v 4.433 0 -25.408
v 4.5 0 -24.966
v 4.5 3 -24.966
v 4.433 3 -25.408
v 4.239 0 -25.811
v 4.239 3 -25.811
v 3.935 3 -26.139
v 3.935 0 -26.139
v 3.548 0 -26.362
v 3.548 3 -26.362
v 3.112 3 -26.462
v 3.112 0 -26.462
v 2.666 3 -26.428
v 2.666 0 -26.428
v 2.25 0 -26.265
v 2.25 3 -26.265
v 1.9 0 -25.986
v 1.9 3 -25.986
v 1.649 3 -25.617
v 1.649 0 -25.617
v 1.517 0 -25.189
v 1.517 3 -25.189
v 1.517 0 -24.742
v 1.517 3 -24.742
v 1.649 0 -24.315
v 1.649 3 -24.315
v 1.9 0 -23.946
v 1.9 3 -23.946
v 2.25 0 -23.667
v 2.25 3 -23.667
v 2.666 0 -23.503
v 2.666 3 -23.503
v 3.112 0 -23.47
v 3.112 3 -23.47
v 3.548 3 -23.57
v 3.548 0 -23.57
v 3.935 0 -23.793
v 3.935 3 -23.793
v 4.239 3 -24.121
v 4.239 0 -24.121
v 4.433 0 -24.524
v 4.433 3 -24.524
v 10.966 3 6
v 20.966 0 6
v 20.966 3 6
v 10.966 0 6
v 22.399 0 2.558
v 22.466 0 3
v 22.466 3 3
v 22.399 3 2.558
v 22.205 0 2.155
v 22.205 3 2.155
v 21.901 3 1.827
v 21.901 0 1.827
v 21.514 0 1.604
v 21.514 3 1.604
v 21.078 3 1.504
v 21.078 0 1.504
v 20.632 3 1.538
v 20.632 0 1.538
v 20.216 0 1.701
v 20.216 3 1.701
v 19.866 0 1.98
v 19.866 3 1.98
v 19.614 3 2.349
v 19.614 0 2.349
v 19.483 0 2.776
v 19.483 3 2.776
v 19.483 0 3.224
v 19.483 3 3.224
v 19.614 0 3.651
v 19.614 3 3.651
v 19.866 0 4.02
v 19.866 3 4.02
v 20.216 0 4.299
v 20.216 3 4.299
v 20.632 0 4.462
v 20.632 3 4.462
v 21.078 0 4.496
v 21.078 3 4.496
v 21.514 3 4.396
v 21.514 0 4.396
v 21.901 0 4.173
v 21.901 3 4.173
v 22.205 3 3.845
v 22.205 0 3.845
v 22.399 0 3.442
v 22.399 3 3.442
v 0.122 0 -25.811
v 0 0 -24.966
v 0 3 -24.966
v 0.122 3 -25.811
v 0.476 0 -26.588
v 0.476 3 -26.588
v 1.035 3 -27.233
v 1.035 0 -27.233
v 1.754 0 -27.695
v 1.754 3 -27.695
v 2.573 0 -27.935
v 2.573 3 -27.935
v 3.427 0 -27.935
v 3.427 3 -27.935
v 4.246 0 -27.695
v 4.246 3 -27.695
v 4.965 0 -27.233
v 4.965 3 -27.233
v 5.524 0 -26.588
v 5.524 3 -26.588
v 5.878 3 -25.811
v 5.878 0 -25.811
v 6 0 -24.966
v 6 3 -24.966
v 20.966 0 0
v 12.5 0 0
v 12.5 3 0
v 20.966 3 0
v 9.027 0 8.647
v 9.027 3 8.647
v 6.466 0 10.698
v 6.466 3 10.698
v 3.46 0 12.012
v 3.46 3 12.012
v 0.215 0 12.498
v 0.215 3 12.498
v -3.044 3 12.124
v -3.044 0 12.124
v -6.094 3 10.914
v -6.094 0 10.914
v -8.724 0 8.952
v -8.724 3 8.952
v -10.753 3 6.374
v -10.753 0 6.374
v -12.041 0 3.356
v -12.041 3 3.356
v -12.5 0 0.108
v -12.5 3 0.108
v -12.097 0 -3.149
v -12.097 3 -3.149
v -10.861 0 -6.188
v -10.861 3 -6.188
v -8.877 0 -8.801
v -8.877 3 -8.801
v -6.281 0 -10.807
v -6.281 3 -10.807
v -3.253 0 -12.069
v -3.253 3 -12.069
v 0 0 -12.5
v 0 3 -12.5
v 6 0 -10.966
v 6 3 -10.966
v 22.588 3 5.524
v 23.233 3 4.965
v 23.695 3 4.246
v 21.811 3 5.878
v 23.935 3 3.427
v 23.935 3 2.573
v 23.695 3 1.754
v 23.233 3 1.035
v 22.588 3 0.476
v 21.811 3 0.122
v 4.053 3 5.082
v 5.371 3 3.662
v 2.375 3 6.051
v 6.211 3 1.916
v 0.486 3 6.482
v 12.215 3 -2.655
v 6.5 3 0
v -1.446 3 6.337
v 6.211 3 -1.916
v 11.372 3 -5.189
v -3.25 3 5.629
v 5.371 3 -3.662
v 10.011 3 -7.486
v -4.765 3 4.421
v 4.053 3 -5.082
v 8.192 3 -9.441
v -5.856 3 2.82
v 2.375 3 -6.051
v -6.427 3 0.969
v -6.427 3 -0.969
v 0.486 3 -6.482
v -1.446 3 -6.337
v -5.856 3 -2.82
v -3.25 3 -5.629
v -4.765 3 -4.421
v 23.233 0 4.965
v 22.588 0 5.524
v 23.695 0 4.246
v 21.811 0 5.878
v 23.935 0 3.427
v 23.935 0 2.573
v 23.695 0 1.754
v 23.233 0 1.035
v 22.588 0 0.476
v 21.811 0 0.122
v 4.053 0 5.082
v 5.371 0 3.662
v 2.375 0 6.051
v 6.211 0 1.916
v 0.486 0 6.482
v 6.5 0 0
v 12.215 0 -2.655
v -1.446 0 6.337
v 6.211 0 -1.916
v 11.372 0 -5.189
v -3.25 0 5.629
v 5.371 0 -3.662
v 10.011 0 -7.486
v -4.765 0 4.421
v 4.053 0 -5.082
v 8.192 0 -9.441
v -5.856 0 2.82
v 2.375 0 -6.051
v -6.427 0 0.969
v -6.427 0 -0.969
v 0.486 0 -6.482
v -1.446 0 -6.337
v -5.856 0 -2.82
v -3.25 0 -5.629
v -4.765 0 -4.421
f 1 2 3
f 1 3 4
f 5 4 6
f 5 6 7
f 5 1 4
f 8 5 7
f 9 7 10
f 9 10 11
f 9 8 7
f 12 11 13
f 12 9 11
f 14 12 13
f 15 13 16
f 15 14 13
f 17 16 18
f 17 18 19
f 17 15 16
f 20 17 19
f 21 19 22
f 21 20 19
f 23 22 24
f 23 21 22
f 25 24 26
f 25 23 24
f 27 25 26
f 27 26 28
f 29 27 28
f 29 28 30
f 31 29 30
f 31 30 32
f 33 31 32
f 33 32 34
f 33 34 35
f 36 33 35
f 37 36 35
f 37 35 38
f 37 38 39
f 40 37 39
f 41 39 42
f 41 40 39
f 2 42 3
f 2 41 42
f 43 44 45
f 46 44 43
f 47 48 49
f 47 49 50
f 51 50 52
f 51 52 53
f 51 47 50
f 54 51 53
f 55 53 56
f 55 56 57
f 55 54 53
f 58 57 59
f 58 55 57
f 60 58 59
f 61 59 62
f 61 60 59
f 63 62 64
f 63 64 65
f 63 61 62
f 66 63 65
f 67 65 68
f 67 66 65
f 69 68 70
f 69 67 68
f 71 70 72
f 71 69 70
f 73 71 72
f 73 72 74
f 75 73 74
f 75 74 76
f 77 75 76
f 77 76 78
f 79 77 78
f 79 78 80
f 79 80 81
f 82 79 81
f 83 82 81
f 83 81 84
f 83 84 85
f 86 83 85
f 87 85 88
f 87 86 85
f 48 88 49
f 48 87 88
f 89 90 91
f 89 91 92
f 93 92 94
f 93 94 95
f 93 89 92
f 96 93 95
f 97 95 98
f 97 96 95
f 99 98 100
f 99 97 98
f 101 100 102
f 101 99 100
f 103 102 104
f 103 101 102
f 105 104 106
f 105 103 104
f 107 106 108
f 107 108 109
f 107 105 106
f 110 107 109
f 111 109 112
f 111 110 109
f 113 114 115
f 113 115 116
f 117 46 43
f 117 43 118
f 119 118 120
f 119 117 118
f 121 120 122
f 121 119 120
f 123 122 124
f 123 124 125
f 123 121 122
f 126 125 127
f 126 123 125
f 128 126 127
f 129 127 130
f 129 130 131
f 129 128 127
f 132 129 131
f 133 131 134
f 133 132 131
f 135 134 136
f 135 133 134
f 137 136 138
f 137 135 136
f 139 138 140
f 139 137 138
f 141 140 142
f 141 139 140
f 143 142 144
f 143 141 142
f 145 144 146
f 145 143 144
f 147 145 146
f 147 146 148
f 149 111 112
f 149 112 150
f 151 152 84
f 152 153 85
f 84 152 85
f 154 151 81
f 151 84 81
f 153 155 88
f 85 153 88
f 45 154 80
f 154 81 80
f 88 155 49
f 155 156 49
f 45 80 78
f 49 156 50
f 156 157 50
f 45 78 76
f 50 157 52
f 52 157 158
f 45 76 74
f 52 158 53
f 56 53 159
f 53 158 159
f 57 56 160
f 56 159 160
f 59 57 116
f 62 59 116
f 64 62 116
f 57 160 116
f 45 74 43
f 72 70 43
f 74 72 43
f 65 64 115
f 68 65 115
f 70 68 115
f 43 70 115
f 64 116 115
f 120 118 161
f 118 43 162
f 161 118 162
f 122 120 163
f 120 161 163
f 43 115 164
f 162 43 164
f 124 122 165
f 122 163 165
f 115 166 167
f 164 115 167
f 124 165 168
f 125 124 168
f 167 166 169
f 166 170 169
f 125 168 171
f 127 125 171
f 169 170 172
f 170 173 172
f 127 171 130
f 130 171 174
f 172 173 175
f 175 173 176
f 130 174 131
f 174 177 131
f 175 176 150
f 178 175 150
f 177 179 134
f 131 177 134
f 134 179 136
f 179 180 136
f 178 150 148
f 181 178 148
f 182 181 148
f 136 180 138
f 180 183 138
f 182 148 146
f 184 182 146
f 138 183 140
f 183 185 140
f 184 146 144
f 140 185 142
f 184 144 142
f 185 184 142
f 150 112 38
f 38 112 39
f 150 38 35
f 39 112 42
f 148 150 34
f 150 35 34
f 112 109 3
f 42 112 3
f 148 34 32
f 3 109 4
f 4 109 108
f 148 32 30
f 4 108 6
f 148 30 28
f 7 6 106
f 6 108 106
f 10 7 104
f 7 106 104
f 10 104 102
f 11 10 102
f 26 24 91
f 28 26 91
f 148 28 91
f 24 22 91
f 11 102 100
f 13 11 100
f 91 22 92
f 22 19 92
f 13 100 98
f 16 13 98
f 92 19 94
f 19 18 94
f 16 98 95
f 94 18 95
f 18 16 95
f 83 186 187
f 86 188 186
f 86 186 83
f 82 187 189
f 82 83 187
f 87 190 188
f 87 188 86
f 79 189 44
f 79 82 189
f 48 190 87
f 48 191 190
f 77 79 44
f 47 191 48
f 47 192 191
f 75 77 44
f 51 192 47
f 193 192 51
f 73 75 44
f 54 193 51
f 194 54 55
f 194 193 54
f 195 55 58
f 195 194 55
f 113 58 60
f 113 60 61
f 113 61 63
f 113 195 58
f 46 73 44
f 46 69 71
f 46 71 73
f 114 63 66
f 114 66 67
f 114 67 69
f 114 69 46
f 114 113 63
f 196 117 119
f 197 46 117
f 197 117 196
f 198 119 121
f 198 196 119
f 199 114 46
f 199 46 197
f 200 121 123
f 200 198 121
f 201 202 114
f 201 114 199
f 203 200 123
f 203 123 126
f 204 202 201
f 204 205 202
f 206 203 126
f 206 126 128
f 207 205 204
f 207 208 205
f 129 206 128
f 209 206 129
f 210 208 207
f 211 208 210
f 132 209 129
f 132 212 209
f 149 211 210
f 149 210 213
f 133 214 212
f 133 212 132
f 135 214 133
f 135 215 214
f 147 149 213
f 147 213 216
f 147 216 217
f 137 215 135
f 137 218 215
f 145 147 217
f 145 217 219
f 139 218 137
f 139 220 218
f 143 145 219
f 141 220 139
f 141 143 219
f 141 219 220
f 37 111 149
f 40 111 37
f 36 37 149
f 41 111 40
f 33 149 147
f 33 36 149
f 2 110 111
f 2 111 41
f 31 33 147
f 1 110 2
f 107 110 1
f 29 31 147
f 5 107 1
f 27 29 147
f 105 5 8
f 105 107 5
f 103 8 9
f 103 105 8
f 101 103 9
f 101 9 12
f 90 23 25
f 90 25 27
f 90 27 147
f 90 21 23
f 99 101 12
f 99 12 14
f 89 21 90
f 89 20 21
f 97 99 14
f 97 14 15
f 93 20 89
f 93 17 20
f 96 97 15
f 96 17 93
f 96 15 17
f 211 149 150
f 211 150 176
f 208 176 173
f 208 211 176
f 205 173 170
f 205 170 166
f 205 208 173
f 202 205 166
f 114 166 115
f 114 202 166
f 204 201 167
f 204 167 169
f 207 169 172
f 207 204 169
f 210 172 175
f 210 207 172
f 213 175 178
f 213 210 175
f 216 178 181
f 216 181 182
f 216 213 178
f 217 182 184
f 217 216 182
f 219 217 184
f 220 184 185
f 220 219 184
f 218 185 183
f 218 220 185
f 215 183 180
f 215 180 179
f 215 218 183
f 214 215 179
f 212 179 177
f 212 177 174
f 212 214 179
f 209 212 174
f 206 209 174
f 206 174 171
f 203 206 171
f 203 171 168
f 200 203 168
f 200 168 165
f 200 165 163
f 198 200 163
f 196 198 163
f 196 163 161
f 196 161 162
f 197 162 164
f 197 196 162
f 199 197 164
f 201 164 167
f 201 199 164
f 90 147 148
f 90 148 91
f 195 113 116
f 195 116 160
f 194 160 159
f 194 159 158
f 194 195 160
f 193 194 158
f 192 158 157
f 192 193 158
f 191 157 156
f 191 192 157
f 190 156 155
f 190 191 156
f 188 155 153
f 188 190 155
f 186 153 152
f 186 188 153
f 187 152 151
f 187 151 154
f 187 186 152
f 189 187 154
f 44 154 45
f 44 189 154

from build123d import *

# Parameters (mm, degrees)
SKETCH1_R           = 6.5
SKETCH1_R_2         = 1.5
BOSS_EXTRUDE1_DEPTH = 3


with BuildPart() as part:
    # Sketch1 → Boss-Extrude1 (new body)
    with BuildSketch(Plane(origin=(0, 0, 0), x_dir=(1, 0, 0), z_dir=(0, 1, 0))):
        with BuildLine():
            Line((0, 12.5), (0, 24.9658561))
            ThreePointArc((0, 24.9658561), (3, 27.9658561), (6, 24.9658561))
            Line((6, 24.9658561), (6, 10.9658561))
            ThreePointArc((6, 10.9658561), (10.752906584, 6.373774392), (12.5, 0))
            Line((12.5, 0), (20.9658561, 0))
            ThreePointArc((20.9658561, 0), (23.9658561, -3), (20.9658561, -6))
            Line((20.9658561, -6), (10.9658561, -6))
            ThreePointArc((10.9658561, -6), (-10.752906584, -6.373774392), (0, 12.5))
        make_face()
        Circle(SKETCH1_R, mode=Mode.SUBTRACT)
        with Locations((3, 24.9658561)):
            Circle(SKETCH1_R_2, mode=Mode.SUBTRACT)
        with Locations((20.9658561, -3)):
            Circle(SKETCH1_R_2, mode=Mode.SUBTRACT)
    extrude(amount=BOSS_EXTRUDE1_DEPTH)


solid = part.part
